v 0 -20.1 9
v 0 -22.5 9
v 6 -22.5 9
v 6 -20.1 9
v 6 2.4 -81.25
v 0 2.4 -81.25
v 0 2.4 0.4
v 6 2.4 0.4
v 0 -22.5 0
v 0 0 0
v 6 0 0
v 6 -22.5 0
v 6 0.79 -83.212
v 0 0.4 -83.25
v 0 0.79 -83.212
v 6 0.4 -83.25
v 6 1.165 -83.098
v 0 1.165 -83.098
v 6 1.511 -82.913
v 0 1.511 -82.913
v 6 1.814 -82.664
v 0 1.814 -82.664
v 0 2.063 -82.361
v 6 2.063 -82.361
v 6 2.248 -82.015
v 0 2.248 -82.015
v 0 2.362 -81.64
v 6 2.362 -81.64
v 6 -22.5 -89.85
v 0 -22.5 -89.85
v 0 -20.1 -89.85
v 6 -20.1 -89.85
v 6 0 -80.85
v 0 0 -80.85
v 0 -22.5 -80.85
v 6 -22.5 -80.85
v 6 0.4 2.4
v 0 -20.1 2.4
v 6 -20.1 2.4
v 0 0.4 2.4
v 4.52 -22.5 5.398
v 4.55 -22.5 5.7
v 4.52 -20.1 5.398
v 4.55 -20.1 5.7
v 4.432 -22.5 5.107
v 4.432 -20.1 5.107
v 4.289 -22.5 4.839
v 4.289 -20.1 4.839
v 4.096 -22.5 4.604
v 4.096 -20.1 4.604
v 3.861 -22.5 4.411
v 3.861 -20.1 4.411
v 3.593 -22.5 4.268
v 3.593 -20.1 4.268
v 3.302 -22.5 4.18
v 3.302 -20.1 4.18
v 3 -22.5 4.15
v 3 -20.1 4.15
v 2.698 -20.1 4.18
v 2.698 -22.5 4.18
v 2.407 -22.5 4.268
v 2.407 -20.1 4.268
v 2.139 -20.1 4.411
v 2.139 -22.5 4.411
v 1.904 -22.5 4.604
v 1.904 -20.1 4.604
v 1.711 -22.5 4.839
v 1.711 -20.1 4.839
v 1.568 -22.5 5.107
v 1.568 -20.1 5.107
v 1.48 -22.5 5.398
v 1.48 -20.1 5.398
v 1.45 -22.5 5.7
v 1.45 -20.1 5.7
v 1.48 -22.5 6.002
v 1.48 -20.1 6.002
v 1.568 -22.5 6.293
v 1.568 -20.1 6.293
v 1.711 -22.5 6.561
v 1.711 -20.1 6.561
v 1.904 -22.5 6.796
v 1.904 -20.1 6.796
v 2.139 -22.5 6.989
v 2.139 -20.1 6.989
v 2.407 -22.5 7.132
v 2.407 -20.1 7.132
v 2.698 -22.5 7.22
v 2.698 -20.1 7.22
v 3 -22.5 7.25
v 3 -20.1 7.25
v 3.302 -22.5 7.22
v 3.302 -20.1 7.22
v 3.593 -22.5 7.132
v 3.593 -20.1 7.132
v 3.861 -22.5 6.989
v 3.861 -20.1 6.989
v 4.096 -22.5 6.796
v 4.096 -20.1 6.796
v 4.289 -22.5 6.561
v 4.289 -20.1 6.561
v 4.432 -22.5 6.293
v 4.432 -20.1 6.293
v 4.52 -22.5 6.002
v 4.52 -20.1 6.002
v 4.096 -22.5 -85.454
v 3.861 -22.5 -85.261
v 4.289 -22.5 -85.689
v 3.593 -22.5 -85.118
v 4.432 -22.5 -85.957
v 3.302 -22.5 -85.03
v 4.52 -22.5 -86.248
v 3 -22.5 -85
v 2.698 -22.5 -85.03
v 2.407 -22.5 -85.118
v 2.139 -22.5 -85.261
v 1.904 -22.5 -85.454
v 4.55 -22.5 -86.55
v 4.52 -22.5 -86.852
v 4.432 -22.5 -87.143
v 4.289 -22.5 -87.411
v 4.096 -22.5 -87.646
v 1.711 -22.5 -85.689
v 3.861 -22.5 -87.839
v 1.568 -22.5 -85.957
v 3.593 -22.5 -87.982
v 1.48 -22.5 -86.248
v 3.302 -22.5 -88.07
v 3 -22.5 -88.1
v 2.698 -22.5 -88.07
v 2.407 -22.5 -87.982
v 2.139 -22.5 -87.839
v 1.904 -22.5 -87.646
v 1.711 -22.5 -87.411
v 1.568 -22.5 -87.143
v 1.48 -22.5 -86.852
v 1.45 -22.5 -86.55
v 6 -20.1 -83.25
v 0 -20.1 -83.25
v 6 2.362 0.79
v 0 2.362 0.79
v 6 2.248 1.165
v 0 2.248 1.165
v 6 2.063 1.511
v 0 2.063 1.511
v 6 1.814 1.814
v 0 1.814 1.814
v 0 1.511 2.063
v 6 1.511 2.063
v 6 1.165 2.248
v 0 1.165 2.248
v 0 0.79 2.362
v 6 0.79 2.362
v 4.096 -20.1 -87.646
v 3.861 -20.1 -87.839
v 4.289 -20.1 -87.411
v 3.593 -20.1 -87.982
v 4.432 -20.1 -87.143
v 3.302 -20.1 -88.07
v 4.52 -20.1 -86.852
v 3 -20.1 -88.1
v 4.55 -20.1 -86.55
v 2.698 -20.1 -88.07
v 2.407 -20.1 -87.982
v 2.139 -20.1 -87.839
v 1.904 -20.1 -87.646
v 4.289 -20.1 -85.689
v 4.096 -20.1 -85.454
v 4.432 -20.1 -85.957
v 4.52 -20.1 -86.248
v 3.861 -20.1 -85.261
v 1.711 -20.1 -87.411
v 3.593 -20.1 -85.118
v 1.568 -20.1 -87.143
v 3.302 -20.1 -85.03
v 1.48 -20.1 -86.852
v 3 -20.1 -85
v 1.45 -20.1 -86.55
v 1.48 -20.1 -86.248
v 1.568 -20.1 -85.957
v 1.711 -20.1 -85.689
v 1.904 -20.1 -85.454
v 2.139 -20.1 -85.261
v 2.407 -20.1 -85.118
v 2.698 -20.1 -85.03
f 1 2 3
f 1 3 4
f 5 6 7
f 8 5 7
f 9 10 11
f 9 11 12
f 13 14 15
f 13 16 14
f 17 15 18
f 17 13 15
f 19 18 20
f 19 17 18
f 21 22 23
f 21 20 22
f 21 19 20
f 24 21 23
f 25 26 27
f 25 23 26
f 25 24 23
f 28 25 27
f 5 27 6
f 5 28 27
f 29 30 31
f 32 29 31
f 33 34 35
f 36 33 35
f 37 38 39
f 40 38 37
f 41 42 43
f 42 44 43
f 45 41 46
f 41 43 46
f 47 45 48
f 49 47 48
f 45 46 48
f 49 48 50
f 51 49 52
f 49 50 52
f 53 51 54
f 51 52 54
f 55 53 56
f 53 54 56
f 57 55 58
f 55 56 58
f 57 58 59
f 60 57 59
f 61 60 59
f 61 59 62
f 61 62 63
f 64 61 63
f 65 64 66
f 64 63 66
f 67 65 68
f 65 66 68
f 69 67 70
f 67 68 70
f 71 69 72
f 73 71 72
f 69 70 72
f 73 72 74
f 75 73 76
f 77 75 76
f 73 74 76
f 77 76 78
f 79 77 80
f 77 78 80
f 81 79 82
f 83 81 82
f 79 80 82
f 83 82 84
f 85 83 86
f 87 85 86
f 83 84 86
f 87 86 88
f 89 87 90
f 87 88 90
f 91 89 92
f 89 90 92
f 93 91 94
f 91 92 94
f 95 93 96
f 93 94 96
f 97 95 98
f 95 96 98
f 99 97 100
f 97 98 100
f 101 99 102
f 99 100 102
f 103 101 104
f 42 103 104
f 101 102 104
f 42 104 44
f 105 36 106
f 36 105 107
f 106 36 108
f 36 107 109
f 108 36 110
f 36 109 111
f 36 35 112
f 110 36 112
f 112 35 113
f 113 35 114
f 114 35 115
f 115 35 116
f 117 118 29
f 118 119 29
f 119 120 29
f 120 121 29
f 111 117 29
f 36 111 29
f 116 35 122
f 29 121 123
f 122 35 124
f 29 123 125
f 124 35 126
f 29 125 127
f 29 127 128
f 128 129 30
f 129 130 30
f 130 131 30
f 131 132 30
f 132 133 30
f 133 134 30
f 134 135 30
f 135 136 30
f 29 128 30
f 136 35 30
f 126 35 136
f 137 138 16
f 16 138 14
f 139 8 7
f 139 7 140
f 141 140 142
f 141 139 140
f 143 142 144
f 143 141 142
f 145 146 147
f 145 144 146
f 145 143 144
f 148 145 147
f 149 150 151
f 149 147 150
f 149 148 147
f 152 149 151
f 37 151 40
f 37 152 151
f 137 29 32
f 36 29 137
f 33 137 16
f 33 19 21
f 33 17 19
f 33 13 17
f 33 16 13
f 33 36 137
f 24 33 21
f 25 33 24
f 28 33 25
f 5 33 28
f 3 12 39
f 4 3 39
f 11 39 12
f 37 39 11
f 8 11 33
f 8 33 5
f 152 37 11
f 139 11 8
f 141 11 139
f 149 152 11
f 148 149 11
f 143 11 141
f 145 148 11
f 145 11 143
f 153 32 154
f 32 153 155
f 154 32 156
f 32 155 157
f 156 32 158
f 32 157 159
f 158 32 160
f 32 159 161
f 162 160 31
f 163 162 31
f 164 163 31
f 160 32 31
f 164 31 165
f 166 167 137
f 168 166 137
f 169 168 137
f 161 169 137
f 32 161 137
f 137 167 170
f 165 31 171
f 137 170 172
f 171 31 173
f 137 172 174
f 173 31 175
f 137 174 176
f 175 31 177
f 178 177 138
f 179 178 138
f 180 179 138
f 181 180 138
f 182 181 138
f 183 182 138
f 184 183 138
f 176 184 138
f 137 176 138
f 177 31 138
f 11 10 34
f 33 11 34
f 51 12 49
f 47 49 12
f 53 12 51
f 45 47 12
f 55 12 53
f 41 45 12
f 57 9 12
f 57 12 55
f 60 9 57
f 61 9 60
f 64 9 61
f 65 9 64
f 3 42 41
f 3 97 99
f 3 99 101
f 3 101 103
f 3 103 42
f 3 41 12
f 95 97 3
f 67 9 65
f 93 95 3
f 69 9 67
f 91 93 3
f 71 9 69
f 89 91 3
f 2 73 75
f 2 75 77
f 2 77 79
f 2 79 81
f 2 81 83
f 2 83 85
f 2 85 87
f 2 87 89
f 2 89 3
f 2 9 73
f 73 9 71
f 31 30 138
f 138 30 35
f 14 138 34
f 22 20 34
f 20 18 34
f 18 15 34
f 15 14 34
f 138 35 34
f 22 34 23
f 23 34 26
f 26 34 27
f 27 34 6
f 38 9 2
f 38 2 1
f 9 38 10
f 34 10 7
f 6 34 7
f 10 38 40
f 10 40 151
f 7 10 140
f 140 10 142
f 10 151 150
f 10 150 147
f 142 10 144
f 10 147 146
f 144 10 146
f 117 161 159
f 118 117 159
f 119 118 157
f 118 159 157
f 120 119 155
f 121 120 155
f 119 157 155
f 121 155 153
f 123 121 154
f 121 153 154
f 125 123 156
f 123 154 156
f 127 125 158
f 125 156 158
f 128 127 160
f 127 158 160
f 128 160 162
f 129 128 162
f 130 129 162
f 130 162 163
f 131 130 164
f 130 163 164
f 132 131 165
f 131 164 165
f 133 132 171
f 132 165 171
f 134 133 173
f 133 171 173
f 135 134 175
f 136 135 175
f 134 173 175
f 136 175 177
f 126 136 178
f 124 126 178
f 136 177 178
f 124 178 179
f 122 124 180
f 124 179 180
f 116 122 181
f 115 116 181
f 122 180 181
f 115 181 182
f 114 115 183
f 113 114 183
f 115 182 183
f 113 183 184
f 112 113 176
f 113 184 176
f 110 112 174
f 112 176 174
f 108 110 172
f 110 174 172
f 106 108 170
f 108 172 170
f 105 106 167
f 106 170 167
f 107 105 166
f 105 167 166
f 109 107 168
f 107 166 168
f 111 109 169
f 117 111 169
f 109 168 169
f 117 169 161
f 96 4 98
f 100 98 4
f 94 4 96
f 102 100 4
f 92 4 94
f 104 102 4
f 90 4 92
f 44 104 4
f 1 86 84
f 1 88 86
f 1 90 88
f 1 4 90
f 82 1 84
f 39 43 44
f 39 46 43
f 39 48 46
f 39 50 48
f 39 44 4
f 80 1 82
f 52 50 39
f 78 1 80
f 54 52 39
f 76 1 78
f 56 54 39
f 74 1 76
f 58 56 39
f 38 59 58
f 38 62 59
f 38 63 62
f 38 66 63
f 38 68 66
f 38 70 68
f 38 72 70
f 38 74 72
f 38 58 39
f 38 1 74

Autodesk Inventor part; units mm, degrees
ref_plane "YZ Plane" through (0, 0, 0) normal (1, 0, 0) x (0, 1, 0)
ref_plane "XZ Plane" through (0, 0, 0) normal (0, 1, 0) x (-1, 0, 0)
ref_plane "XY Plane" through (0, 0, 0) normal (0, 0, 1) x (1, 0, 0)
sketch "Sketch1" plane through (0, 0, 0) normal (1, 0, 0) x (0, 1, 0)
  line L0 (0, 0) -> (0, -80.85)
  line L1 (0, 0) -> (-22.5, 0)
  line L2 (-22.5, 0) -> (-22.5, 9)
  line L3 (-22.5, 9) -> (-20.1, 9)
  line L4 (-20.1, 9) -> (-20.1, 2.4)
  line L5 (-20.1, 2.4) -> (2.4, 2.4)
  line L6 (2.4, 2.4) -> (2.4, -40.425)
  line L7 (0, -80.85) -> (-22.5, -80.85)
  line L8 (-22.5, -80.85) -> (-22.5, -89.85)
  line L9 (-22.5, -89.85) -> (-20.1, -89.85)
  line L10 (-20.1, -89.85) -> (-20.1, -83.25)
  line L11 (-20.1, -83.25) -> (2.4, -83.25)
  line L12 (2.4, -83.25) -> (2.4, -40.425)
  dimension "d0" = 80.85
  dimension "d17" = 22.5
  dimension "d18" = 9
  dimension "d19" = 2.4
  dimension "d20" = 6.6
  dimension "d21" = 22.5
  dimension "d23" = 2.4
  dimension "d24" = 2.4
  dimension "d25" = 9
  dimension "d26" = 2.4
extrude "Extrusion1" add sketch "Sketch1" along normal blind 6
fillet "Fillet1" radius 2 1 edges at (3, 2.4, 2.4)
fillet "Fillet2" radius 2 1 edges at (3, 2.4, -83.25)
sketch "Sketch3" plane through (0, -20.1, 9) normal (0, 1, 0) x (1, 0, 0)
  line L0 (0, 6.6) -> (0, 0) projected
  line L1 (0, 6.6) -> (6, 6.6) projected
  circle A0 centre (3, 3.3) radius 1.55
  line L2 (0, 92.25) -> (6, 92.25) projected
  line L3 (6, 98.85) -> (6, 92.25) projected
  circle A1 centre (3, 95.55) radius 1.55
  line L4 (0, 0) -> (6, 0) projected
  line L5 (0, 98.85) -> (0, 92.25) projected
  point P0 (0, 9)
  dimension "d29" = 3.1
  dimension "d30" = 3.1
extrude "Extrusion3" cut sketch "Sketch3" against normal blind 10
properties part number "battery_pack_clamp" material "PET Plastic"
